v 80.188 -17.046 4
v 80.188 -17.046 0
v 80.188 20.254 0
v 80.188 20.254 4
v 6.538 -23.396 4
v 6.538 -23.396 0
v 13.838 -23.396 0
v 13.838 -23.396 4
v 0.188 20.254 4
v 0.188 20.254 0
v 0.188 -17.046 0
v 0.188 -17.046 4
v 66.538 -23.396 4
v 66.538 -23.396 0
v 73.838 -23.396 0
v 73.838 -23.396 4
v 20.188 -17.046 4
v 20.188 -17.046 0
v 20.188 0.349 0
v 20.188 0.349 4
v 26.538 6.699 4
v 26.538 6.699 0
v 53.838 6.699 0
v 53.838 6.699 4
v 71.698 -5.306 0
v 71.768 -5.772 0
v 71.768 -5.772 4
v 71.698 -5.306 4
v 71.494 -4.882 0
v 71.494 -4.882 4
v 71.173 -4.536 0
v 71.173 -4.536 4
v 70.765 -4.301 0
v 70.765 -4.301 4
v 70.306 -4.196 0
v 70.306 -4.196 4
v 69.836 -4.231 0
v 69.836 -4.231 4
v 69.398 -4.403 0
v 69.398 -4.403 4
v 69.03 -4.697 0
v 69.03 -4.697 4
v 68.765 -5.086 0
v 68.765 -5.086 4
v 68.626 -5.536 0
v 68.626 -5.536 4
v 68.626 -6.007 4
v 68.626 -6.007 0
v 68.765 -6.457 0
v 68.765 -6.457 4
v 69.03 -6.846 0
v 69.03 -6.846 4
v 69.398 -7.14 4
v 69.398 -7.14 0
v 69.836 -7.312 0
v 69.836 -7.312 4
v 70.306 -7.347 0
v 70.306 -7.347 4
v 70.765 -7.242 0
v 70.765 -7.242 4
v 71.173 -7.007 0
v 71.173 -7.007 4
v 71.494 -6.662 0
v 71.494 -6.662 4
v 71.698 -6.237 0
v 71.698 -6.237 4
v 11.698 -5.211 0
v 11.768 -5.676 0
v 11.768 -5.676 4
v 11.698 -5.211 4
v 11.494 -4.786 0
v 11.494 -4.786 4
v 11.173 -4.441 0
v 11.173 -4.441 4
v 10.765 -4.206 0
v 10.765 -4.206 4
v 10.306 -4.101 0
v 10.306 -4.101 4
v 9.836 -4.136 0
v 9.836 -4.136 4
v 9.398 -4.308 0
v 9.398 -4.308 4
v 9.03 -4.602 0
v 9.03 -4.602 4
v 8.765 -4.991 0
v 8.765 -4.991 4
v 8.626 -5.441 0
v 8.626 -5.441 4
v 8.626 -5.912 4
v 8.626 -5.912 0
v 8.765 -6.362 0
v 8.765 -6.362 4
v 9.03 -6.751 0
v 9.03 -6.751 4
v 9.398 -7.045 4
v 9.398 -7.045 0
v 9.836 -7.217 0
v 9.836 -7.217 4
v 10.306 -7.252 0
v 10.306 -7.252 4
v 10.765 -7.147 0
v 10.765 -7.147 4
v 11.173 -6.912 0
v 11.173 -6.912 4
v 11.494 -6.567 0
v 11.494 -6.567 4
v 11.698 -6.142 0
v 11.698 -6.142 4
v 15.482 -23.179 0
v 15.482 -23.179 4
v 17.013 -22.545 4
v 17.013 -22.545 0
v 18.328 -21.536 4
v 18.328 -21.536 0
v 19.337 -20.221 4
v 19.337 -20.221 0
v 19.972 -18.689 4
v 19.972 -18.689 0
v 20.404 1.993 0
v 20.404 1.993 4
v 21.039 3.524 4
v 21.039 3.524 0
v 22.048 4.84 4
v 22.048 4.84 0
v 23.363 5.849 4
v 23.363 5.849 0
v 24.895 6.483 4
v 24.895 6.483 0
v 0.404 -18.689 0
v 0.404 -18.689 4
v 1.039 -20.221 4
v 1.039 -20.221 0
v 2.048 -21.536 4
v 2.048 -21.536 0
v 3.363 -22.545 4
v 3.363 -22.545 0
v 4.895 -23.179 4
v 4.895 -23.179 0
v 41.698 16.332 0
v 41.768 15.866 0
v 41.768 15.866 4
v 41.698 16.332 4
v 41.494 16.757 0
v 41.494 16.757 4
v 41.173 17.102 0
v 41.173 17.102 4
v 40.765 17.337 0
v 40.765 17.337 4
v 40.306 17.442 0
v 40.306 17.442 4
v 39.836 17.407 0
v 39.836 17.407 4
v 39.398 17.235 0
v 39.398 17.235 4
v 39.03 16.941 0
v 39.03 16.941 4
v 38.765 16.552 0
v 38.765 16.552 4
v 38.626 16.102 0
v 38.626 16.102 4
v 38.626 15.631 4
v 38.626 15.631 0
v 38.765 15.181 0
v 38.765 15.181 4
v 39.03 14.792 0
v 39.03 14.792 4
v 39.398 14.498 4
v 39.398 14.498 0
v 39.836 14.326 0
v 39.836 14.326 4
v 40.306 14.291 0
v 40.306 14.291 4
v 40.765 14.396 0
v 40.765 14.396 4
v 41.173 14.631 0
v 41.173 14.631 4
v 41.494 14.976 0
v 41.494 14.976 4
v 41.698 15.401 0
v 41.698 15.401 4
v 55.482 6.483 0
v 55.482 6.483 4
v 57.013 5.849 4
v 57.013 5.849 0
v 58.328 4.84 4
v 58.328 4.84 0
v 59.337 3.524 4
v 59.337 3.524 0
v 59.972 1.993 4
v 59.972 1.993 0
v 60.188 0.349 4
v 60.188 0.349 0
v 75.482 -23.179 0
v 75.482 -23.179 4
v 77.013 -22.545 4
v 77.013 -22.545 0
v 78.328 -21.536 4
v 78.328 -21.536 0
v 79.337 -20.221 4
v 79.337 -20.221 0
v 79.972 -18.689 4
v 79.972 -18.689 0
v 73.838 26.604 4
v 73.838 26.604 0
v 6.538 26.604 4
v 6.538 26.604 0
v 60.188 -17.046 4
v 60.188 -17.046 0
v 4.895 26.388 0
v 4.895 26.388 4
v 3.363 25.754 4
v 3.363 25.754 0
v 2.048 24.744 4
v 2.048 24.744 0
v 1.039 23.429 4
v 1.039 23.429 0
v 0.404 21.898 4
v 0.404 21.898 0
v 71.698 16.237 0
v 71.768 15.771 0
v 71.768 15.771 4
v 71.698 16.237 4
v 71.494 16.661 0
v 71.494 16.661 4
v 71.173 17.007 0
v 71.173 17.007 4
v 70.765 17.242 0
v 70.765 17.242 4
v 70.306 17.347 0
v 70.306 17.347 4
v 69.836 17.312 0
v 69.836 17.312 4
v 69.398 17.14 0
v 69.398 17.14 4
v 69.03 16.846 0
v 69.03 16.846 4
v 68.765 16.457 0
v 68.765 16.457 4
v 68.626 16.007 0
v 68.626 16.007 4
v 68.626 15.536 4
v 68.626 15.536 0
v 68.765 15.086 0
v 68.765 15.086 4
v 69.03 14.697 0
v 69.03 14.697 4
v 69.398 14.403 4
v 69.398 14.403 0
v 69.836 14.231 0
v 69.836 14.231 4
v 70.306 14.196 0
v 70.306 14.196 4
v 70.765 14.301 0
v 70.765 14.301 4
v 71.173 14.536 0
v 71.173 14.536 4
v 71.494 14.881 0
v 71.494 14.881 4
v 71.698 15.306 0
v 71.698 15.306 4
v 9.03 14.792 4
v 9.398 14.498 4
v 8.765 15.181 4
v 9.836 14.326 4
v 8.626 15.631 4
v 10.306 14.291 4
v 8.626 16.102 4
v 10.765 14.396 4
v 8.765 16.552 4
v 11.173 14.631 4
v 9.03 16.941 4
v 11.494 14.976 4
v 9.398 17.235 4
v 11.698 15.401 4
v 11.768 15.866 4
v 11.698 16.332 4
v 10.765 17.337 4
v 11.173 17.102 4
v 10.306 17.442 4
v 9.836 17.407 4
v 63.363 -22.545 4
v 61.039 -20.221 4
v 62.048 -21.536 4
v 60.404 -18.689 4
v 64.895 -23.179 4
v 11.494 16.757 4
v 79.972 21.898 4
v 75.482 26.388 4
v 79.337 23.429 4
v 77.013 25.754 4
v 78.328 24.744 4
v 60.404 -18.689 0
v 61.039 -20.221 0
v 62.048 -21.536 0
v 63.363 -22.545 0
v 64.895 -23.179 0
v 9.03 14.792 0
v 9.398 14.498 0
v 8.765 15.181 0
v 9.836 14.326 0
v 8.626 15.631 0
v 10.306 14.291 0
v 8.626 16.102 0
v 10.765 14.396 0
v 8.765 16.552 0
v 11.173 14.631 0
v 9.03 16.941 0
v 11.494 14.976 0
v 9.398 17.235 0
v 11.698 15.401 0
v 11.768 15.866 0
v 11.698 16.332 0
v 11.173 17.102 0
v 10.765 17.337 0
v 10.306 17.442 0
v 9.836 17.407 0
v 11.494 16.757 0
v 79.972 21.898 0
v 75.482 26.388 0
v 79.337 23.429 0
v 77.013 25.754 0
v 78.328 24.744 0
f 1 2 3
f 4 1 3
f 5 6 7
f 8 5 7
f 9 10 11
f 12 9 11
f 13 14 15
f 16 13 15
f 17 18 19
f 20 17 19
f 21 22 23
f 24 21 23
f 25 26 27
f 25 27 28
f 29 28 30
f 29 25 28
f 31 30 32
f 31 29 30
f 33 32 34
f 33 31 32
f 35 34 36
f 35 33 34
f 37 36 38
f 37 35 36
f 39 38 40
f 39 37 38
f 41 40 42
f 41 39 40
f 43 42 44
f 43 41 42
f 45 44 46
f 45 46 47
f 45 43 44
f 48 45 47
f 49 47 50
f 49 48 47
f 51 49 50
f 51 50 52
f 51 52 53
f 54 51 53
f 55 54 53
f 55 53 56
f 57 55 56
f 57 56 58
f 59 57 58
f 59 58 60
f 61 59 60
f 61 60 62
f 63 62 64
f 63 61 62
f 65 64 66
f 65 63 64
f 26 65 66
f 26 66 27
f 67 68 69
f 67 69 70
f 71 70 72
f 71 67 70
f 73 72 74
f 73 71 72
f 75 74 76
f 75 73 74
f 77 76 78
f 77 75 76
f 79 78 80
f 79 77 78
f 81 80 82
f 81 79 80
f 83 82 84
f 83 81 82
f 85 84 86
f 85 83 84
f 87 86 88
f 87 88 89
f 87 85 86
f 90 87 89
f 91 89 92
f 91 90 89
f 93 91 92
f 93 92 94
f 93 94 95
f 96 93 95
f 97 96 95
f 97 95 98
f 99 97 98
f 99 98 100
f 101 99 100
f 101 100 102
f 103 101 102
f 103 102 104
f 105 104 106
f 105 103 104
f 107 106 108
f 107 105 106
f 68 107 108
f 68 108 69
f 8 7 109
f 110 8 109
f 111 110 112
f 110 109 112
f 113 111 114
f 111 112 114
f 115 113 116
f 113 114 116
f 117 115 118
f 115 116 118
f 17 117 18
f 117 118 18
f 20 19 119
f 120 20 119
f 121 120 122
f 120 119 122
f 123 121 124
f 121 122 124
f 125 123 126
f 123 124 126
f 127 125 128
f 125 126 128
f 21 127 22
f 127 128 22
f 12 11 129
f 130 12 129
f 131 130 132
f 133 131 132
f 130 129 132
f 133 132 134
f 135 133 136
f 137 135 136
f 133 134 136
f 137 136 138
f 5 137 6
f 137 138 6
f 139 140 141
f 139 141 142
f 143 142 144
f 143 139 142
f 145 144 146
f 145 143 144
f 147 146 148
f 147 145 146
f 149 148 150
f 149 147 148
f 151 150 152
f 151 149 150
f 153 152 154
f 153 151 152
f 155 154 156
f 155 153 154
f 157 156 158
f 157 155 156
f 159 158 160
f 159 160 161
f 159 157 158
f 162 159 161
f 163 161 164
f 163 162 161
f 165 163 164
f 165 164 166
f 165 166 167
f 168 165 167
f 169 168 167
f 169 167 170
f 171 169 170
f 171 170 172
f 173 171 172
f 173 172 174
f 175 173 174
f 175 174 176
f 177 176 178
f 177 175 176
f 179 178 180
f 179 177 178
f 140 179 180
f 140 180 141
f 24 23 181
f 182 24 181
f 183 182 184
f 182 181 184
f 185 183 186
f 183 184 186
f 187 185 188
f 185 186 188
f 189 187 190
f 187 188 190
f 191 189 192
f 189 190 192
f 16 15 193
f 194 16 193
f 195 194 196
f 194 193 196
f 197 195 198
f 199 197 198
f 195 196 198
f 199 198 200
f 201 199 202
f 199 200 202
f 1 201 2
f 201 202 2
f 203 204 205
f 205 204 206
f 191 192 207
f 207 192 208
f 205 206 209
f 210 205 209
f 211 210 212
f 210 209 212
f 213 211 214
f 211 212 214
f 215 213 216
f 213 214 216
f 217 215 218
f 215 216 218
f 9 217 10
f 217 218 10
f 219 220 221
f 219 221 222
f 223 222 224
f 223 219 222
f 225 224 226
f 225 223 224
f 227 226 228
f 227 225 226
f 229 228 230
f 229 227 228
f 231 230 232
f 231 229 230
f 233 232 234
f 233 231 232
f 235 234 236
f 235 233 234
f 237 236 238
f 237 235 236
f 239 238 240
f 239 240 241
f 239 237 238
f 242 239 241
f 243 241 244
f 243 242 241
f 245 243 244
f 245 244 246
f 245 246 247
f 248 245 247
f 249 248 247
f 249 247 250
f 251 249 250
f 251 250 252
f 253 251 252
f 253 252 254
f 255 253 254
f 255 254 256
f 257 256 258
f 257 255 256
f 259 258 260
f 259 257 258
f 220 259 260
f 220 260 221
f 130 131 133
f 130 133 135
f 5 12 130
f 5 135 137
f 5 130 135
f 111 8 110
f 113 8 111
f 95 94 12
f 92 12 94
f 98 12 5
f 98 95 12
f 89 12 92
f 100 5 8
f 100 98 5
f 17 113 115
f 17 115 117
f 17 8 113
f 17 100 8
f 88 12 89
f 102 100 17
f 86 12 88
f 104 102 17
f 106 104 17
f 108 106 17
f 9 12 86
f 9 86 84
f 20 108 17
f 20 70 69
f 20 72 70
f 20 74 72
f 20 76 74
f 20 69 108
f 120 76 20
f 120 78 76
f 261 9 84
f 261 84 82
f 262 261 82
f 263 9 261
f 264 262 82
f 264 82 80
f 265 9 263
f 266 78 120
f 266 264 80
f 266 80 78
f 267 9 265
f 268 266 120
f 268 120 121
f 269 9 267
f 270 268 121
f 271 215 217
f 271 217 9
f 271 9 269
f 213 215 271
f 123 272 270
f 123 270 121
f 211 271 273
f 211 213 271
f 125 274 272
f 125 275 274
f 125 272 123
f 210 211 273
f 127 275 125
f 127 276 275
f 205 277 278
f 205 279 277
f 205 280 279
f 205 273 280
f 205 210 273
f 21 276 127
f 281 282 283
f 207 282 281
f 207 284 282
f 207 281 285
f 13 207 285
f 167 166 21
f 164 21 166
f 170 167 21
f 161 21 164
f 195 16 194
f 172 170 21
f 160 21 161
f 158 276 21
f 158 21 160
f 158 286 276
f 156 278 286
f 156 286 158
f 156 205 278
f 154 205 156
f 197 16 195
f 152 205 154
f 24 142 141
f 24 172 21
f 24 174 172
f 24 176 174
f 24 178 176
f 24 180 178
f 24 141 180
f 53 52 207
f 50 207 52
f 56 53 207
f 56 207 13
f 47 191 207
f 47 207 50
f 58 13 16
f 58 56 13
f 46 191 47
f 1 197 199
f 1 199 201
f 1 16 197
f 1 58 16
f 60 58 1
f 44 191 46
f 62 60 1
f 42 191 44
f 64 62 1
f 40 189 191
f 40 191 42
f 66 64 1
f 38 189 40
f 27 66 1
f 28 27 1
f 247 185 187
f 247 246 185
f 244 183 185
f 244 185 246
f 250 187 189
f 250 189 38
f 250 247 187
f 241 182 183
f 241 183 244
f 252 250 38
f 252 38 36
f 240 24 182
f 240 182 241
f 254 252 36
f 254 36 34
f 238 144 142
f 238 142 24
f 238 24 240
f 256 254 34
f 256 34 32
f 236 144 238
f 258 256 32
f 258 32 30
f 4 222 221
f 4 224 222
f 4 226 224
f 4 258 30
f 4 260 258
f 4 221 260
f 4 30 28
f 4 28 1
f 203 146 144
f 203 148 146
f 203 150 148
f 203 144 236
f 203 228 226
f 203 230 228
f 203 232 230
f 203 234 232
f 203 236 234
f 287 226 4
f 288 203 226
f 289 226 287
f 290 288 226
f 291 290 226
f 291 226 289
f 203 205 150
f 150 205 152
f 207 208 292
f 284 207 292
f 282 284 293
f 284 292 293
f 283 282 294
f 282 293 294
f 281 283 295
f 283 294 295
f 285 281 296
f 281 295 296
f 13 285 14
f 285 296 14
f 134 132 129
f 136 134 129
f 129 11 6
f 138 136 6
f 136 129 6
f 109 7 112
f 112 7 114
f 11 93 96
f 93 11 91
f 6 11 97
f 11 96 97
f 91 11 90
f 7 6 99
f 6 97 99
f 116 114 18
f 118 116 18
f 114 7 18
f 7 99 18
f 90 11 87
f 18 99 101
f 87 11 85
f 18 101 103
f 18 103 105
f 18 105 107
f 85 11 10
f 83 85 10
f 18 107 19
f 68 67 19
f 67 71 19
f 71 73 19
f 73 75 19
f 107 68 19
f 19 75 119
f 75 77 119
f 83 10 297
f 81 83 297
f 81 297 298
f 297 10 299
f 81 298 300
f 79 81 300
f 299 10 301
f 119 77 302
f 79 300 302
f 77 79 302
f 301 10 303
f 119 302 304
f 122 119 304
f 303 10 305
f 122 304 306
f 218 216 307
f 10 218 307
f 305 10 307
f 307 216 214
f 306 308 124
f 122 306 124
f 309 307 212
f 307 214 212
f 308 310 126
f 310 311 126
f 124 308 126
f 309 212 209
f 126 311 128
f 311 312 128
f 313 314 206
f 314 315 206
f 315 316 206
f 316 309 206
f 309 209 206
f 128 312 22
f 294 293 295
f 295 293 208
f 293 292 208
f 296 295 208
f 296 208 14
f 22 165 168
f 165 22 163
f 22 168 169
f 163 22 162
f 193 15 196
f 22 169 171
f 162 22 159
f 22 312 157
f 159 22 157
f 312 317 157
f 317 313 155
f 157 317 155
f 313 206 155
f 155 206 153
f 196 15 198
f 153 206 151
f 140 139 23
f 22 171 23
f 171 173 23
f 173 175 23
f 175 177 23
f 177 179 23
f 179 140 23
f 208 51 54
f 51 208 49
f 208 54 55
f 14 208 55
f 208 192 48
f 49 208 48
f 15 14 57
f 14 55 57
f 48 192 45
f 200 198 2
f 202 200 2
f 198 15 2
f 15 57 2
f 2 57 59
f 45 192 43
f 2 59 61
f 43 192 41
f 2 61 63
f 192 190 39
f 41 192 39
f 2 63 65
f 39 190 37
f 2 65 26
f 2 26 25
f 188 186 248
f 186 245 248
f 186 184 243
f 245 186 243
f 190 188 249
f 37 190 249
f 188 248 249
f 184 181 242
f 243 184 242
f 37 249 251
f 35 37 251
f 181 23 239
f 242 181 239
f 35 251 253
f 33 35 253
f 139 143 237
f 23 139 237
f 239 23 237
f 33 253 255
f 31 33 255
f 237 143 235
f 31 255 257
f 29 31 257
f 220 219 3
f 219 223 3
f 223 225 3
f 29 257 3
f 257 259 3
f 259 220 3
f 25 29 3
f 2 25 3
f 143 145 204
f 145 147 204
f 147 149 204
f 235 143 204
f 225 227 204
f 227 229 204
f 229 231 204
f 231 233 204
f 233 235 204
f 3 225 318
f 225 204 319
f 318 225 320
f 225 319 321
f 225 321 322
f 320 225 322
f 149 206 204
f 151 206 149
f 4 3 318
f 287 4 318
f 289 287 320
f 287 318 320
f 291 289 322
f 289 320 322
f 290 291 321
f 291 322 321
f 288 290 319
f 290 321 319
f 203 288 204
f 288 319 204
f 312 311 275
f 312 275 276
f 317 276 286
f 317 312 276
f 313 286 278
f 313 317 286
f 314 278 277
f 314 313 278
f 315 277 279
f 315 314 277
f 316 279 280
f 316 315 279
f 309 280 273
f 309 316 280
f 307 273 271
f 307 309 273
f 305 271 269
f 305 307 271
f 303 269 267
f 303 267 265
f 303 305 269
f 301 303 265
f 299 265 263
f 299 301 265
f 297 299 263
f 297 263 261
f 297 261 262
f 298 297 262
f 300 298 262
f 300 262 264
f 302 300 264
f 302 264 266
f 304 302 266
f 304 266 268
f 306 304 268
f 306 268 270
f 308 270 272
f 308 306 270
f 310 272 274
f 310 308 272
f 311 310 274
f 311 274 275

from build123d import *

# Parameters (mm, degrees)
CROQUIS1_R              = 1.58
SALIENTE_EXTRUIR1_DEPTH = 4


with BuildPart() as part:
    # Croquis1 → Saliente-Extruir1 (new body)
    with BuildSketch(Plane.XY):
        with BuildLine():
            Line((26.538050923, 6.699416954), (53.838050923, 6.699416954))
            ThreePointArc((53.838050923, 6.699416954), (58.328178983, 4.839545014), (60.188050923, 0.349416954))
            Line((60.188050923, 0.349416954), (60.188050923, -17.045643676))
            ThreePointArc((60.188050923, -17.045643676), (62.047922862, -21.535771736), (66.538050923, -23.395643676))
            Line((66.538050923, -23.395643676), (73.838050923, -23.395643676))
            ThreePointArc((73.838050923, -23.395643676), (78.328178983, -21.535771736), (80.188050923, -17.045643676))
            Line((80.188050923, -17.045643676), (80.188050923, 6.604356324))
            Line((80.188050923, 6.604356324), (80.188050923, 20.254356324))
            ThreePointArc((80.188050923, 20.254356324), (78.328178983, 24.744484385), (73.838050923, 26.604356324))
            Line((73.838050923, 26.604356324), (6.538050923, 26.604356324))
            ThreePointArc((6.538050923, 26.604356324), (2.047922862, 24.744484385), (0.188050923, 20.254356324))
            Line((0.188050923, 20.254356324), (0.188050923, 6.604356324))
            Line((0.188050923, 6.604356324), (0.188050923, -17.045643676))
            ThreePointArc((0.188050923, -17.045643676), (2.047922862, -21.535771736), (6.538050923, -23.395643676))
            Line((6.538050923, -23.395643676), (13.838050923, -23.395643676))
            ThreePointArc((13.838050923, -23.395643676), (18.328178983, -21.535771736), (20.188050923, -17.045643676))
            Line((20.188050923, -17.045643676), (20.188050923, 0.349416954))
            ThreePointArc((20.188050923, 0.349416954), (22.047922862, 4.839545014), (26.538050923, 6.699416954))
        make_face()
        with Locations((40.188050923, 15.866498333)):
            Circle(CROQUIS1_R, mode=Mode.SUBTRACT)
        with Locations((10.188050923, 15.866498333)):
            Circle(CROQUIS1_R, mode=Mode.SUBTRACT)
        with Locations((70.188050923, 15.771437703)):
            Circle(CROQUIS1_R, mode=Mode.SUBTRACT)
        with Locations((10.188050923, -5.676497666)):
            Circle(CROQUIS1_R, mode=Mode.SUBTRACT)
        with Locations((70.188050923, -5.771558296)):
            Circle(CROQUIS1_R, mode=Mode.SUBTRACT)
    extrude(amount=SALIENTE_EXTRUIR1_DEPTH)


solid = part.part
